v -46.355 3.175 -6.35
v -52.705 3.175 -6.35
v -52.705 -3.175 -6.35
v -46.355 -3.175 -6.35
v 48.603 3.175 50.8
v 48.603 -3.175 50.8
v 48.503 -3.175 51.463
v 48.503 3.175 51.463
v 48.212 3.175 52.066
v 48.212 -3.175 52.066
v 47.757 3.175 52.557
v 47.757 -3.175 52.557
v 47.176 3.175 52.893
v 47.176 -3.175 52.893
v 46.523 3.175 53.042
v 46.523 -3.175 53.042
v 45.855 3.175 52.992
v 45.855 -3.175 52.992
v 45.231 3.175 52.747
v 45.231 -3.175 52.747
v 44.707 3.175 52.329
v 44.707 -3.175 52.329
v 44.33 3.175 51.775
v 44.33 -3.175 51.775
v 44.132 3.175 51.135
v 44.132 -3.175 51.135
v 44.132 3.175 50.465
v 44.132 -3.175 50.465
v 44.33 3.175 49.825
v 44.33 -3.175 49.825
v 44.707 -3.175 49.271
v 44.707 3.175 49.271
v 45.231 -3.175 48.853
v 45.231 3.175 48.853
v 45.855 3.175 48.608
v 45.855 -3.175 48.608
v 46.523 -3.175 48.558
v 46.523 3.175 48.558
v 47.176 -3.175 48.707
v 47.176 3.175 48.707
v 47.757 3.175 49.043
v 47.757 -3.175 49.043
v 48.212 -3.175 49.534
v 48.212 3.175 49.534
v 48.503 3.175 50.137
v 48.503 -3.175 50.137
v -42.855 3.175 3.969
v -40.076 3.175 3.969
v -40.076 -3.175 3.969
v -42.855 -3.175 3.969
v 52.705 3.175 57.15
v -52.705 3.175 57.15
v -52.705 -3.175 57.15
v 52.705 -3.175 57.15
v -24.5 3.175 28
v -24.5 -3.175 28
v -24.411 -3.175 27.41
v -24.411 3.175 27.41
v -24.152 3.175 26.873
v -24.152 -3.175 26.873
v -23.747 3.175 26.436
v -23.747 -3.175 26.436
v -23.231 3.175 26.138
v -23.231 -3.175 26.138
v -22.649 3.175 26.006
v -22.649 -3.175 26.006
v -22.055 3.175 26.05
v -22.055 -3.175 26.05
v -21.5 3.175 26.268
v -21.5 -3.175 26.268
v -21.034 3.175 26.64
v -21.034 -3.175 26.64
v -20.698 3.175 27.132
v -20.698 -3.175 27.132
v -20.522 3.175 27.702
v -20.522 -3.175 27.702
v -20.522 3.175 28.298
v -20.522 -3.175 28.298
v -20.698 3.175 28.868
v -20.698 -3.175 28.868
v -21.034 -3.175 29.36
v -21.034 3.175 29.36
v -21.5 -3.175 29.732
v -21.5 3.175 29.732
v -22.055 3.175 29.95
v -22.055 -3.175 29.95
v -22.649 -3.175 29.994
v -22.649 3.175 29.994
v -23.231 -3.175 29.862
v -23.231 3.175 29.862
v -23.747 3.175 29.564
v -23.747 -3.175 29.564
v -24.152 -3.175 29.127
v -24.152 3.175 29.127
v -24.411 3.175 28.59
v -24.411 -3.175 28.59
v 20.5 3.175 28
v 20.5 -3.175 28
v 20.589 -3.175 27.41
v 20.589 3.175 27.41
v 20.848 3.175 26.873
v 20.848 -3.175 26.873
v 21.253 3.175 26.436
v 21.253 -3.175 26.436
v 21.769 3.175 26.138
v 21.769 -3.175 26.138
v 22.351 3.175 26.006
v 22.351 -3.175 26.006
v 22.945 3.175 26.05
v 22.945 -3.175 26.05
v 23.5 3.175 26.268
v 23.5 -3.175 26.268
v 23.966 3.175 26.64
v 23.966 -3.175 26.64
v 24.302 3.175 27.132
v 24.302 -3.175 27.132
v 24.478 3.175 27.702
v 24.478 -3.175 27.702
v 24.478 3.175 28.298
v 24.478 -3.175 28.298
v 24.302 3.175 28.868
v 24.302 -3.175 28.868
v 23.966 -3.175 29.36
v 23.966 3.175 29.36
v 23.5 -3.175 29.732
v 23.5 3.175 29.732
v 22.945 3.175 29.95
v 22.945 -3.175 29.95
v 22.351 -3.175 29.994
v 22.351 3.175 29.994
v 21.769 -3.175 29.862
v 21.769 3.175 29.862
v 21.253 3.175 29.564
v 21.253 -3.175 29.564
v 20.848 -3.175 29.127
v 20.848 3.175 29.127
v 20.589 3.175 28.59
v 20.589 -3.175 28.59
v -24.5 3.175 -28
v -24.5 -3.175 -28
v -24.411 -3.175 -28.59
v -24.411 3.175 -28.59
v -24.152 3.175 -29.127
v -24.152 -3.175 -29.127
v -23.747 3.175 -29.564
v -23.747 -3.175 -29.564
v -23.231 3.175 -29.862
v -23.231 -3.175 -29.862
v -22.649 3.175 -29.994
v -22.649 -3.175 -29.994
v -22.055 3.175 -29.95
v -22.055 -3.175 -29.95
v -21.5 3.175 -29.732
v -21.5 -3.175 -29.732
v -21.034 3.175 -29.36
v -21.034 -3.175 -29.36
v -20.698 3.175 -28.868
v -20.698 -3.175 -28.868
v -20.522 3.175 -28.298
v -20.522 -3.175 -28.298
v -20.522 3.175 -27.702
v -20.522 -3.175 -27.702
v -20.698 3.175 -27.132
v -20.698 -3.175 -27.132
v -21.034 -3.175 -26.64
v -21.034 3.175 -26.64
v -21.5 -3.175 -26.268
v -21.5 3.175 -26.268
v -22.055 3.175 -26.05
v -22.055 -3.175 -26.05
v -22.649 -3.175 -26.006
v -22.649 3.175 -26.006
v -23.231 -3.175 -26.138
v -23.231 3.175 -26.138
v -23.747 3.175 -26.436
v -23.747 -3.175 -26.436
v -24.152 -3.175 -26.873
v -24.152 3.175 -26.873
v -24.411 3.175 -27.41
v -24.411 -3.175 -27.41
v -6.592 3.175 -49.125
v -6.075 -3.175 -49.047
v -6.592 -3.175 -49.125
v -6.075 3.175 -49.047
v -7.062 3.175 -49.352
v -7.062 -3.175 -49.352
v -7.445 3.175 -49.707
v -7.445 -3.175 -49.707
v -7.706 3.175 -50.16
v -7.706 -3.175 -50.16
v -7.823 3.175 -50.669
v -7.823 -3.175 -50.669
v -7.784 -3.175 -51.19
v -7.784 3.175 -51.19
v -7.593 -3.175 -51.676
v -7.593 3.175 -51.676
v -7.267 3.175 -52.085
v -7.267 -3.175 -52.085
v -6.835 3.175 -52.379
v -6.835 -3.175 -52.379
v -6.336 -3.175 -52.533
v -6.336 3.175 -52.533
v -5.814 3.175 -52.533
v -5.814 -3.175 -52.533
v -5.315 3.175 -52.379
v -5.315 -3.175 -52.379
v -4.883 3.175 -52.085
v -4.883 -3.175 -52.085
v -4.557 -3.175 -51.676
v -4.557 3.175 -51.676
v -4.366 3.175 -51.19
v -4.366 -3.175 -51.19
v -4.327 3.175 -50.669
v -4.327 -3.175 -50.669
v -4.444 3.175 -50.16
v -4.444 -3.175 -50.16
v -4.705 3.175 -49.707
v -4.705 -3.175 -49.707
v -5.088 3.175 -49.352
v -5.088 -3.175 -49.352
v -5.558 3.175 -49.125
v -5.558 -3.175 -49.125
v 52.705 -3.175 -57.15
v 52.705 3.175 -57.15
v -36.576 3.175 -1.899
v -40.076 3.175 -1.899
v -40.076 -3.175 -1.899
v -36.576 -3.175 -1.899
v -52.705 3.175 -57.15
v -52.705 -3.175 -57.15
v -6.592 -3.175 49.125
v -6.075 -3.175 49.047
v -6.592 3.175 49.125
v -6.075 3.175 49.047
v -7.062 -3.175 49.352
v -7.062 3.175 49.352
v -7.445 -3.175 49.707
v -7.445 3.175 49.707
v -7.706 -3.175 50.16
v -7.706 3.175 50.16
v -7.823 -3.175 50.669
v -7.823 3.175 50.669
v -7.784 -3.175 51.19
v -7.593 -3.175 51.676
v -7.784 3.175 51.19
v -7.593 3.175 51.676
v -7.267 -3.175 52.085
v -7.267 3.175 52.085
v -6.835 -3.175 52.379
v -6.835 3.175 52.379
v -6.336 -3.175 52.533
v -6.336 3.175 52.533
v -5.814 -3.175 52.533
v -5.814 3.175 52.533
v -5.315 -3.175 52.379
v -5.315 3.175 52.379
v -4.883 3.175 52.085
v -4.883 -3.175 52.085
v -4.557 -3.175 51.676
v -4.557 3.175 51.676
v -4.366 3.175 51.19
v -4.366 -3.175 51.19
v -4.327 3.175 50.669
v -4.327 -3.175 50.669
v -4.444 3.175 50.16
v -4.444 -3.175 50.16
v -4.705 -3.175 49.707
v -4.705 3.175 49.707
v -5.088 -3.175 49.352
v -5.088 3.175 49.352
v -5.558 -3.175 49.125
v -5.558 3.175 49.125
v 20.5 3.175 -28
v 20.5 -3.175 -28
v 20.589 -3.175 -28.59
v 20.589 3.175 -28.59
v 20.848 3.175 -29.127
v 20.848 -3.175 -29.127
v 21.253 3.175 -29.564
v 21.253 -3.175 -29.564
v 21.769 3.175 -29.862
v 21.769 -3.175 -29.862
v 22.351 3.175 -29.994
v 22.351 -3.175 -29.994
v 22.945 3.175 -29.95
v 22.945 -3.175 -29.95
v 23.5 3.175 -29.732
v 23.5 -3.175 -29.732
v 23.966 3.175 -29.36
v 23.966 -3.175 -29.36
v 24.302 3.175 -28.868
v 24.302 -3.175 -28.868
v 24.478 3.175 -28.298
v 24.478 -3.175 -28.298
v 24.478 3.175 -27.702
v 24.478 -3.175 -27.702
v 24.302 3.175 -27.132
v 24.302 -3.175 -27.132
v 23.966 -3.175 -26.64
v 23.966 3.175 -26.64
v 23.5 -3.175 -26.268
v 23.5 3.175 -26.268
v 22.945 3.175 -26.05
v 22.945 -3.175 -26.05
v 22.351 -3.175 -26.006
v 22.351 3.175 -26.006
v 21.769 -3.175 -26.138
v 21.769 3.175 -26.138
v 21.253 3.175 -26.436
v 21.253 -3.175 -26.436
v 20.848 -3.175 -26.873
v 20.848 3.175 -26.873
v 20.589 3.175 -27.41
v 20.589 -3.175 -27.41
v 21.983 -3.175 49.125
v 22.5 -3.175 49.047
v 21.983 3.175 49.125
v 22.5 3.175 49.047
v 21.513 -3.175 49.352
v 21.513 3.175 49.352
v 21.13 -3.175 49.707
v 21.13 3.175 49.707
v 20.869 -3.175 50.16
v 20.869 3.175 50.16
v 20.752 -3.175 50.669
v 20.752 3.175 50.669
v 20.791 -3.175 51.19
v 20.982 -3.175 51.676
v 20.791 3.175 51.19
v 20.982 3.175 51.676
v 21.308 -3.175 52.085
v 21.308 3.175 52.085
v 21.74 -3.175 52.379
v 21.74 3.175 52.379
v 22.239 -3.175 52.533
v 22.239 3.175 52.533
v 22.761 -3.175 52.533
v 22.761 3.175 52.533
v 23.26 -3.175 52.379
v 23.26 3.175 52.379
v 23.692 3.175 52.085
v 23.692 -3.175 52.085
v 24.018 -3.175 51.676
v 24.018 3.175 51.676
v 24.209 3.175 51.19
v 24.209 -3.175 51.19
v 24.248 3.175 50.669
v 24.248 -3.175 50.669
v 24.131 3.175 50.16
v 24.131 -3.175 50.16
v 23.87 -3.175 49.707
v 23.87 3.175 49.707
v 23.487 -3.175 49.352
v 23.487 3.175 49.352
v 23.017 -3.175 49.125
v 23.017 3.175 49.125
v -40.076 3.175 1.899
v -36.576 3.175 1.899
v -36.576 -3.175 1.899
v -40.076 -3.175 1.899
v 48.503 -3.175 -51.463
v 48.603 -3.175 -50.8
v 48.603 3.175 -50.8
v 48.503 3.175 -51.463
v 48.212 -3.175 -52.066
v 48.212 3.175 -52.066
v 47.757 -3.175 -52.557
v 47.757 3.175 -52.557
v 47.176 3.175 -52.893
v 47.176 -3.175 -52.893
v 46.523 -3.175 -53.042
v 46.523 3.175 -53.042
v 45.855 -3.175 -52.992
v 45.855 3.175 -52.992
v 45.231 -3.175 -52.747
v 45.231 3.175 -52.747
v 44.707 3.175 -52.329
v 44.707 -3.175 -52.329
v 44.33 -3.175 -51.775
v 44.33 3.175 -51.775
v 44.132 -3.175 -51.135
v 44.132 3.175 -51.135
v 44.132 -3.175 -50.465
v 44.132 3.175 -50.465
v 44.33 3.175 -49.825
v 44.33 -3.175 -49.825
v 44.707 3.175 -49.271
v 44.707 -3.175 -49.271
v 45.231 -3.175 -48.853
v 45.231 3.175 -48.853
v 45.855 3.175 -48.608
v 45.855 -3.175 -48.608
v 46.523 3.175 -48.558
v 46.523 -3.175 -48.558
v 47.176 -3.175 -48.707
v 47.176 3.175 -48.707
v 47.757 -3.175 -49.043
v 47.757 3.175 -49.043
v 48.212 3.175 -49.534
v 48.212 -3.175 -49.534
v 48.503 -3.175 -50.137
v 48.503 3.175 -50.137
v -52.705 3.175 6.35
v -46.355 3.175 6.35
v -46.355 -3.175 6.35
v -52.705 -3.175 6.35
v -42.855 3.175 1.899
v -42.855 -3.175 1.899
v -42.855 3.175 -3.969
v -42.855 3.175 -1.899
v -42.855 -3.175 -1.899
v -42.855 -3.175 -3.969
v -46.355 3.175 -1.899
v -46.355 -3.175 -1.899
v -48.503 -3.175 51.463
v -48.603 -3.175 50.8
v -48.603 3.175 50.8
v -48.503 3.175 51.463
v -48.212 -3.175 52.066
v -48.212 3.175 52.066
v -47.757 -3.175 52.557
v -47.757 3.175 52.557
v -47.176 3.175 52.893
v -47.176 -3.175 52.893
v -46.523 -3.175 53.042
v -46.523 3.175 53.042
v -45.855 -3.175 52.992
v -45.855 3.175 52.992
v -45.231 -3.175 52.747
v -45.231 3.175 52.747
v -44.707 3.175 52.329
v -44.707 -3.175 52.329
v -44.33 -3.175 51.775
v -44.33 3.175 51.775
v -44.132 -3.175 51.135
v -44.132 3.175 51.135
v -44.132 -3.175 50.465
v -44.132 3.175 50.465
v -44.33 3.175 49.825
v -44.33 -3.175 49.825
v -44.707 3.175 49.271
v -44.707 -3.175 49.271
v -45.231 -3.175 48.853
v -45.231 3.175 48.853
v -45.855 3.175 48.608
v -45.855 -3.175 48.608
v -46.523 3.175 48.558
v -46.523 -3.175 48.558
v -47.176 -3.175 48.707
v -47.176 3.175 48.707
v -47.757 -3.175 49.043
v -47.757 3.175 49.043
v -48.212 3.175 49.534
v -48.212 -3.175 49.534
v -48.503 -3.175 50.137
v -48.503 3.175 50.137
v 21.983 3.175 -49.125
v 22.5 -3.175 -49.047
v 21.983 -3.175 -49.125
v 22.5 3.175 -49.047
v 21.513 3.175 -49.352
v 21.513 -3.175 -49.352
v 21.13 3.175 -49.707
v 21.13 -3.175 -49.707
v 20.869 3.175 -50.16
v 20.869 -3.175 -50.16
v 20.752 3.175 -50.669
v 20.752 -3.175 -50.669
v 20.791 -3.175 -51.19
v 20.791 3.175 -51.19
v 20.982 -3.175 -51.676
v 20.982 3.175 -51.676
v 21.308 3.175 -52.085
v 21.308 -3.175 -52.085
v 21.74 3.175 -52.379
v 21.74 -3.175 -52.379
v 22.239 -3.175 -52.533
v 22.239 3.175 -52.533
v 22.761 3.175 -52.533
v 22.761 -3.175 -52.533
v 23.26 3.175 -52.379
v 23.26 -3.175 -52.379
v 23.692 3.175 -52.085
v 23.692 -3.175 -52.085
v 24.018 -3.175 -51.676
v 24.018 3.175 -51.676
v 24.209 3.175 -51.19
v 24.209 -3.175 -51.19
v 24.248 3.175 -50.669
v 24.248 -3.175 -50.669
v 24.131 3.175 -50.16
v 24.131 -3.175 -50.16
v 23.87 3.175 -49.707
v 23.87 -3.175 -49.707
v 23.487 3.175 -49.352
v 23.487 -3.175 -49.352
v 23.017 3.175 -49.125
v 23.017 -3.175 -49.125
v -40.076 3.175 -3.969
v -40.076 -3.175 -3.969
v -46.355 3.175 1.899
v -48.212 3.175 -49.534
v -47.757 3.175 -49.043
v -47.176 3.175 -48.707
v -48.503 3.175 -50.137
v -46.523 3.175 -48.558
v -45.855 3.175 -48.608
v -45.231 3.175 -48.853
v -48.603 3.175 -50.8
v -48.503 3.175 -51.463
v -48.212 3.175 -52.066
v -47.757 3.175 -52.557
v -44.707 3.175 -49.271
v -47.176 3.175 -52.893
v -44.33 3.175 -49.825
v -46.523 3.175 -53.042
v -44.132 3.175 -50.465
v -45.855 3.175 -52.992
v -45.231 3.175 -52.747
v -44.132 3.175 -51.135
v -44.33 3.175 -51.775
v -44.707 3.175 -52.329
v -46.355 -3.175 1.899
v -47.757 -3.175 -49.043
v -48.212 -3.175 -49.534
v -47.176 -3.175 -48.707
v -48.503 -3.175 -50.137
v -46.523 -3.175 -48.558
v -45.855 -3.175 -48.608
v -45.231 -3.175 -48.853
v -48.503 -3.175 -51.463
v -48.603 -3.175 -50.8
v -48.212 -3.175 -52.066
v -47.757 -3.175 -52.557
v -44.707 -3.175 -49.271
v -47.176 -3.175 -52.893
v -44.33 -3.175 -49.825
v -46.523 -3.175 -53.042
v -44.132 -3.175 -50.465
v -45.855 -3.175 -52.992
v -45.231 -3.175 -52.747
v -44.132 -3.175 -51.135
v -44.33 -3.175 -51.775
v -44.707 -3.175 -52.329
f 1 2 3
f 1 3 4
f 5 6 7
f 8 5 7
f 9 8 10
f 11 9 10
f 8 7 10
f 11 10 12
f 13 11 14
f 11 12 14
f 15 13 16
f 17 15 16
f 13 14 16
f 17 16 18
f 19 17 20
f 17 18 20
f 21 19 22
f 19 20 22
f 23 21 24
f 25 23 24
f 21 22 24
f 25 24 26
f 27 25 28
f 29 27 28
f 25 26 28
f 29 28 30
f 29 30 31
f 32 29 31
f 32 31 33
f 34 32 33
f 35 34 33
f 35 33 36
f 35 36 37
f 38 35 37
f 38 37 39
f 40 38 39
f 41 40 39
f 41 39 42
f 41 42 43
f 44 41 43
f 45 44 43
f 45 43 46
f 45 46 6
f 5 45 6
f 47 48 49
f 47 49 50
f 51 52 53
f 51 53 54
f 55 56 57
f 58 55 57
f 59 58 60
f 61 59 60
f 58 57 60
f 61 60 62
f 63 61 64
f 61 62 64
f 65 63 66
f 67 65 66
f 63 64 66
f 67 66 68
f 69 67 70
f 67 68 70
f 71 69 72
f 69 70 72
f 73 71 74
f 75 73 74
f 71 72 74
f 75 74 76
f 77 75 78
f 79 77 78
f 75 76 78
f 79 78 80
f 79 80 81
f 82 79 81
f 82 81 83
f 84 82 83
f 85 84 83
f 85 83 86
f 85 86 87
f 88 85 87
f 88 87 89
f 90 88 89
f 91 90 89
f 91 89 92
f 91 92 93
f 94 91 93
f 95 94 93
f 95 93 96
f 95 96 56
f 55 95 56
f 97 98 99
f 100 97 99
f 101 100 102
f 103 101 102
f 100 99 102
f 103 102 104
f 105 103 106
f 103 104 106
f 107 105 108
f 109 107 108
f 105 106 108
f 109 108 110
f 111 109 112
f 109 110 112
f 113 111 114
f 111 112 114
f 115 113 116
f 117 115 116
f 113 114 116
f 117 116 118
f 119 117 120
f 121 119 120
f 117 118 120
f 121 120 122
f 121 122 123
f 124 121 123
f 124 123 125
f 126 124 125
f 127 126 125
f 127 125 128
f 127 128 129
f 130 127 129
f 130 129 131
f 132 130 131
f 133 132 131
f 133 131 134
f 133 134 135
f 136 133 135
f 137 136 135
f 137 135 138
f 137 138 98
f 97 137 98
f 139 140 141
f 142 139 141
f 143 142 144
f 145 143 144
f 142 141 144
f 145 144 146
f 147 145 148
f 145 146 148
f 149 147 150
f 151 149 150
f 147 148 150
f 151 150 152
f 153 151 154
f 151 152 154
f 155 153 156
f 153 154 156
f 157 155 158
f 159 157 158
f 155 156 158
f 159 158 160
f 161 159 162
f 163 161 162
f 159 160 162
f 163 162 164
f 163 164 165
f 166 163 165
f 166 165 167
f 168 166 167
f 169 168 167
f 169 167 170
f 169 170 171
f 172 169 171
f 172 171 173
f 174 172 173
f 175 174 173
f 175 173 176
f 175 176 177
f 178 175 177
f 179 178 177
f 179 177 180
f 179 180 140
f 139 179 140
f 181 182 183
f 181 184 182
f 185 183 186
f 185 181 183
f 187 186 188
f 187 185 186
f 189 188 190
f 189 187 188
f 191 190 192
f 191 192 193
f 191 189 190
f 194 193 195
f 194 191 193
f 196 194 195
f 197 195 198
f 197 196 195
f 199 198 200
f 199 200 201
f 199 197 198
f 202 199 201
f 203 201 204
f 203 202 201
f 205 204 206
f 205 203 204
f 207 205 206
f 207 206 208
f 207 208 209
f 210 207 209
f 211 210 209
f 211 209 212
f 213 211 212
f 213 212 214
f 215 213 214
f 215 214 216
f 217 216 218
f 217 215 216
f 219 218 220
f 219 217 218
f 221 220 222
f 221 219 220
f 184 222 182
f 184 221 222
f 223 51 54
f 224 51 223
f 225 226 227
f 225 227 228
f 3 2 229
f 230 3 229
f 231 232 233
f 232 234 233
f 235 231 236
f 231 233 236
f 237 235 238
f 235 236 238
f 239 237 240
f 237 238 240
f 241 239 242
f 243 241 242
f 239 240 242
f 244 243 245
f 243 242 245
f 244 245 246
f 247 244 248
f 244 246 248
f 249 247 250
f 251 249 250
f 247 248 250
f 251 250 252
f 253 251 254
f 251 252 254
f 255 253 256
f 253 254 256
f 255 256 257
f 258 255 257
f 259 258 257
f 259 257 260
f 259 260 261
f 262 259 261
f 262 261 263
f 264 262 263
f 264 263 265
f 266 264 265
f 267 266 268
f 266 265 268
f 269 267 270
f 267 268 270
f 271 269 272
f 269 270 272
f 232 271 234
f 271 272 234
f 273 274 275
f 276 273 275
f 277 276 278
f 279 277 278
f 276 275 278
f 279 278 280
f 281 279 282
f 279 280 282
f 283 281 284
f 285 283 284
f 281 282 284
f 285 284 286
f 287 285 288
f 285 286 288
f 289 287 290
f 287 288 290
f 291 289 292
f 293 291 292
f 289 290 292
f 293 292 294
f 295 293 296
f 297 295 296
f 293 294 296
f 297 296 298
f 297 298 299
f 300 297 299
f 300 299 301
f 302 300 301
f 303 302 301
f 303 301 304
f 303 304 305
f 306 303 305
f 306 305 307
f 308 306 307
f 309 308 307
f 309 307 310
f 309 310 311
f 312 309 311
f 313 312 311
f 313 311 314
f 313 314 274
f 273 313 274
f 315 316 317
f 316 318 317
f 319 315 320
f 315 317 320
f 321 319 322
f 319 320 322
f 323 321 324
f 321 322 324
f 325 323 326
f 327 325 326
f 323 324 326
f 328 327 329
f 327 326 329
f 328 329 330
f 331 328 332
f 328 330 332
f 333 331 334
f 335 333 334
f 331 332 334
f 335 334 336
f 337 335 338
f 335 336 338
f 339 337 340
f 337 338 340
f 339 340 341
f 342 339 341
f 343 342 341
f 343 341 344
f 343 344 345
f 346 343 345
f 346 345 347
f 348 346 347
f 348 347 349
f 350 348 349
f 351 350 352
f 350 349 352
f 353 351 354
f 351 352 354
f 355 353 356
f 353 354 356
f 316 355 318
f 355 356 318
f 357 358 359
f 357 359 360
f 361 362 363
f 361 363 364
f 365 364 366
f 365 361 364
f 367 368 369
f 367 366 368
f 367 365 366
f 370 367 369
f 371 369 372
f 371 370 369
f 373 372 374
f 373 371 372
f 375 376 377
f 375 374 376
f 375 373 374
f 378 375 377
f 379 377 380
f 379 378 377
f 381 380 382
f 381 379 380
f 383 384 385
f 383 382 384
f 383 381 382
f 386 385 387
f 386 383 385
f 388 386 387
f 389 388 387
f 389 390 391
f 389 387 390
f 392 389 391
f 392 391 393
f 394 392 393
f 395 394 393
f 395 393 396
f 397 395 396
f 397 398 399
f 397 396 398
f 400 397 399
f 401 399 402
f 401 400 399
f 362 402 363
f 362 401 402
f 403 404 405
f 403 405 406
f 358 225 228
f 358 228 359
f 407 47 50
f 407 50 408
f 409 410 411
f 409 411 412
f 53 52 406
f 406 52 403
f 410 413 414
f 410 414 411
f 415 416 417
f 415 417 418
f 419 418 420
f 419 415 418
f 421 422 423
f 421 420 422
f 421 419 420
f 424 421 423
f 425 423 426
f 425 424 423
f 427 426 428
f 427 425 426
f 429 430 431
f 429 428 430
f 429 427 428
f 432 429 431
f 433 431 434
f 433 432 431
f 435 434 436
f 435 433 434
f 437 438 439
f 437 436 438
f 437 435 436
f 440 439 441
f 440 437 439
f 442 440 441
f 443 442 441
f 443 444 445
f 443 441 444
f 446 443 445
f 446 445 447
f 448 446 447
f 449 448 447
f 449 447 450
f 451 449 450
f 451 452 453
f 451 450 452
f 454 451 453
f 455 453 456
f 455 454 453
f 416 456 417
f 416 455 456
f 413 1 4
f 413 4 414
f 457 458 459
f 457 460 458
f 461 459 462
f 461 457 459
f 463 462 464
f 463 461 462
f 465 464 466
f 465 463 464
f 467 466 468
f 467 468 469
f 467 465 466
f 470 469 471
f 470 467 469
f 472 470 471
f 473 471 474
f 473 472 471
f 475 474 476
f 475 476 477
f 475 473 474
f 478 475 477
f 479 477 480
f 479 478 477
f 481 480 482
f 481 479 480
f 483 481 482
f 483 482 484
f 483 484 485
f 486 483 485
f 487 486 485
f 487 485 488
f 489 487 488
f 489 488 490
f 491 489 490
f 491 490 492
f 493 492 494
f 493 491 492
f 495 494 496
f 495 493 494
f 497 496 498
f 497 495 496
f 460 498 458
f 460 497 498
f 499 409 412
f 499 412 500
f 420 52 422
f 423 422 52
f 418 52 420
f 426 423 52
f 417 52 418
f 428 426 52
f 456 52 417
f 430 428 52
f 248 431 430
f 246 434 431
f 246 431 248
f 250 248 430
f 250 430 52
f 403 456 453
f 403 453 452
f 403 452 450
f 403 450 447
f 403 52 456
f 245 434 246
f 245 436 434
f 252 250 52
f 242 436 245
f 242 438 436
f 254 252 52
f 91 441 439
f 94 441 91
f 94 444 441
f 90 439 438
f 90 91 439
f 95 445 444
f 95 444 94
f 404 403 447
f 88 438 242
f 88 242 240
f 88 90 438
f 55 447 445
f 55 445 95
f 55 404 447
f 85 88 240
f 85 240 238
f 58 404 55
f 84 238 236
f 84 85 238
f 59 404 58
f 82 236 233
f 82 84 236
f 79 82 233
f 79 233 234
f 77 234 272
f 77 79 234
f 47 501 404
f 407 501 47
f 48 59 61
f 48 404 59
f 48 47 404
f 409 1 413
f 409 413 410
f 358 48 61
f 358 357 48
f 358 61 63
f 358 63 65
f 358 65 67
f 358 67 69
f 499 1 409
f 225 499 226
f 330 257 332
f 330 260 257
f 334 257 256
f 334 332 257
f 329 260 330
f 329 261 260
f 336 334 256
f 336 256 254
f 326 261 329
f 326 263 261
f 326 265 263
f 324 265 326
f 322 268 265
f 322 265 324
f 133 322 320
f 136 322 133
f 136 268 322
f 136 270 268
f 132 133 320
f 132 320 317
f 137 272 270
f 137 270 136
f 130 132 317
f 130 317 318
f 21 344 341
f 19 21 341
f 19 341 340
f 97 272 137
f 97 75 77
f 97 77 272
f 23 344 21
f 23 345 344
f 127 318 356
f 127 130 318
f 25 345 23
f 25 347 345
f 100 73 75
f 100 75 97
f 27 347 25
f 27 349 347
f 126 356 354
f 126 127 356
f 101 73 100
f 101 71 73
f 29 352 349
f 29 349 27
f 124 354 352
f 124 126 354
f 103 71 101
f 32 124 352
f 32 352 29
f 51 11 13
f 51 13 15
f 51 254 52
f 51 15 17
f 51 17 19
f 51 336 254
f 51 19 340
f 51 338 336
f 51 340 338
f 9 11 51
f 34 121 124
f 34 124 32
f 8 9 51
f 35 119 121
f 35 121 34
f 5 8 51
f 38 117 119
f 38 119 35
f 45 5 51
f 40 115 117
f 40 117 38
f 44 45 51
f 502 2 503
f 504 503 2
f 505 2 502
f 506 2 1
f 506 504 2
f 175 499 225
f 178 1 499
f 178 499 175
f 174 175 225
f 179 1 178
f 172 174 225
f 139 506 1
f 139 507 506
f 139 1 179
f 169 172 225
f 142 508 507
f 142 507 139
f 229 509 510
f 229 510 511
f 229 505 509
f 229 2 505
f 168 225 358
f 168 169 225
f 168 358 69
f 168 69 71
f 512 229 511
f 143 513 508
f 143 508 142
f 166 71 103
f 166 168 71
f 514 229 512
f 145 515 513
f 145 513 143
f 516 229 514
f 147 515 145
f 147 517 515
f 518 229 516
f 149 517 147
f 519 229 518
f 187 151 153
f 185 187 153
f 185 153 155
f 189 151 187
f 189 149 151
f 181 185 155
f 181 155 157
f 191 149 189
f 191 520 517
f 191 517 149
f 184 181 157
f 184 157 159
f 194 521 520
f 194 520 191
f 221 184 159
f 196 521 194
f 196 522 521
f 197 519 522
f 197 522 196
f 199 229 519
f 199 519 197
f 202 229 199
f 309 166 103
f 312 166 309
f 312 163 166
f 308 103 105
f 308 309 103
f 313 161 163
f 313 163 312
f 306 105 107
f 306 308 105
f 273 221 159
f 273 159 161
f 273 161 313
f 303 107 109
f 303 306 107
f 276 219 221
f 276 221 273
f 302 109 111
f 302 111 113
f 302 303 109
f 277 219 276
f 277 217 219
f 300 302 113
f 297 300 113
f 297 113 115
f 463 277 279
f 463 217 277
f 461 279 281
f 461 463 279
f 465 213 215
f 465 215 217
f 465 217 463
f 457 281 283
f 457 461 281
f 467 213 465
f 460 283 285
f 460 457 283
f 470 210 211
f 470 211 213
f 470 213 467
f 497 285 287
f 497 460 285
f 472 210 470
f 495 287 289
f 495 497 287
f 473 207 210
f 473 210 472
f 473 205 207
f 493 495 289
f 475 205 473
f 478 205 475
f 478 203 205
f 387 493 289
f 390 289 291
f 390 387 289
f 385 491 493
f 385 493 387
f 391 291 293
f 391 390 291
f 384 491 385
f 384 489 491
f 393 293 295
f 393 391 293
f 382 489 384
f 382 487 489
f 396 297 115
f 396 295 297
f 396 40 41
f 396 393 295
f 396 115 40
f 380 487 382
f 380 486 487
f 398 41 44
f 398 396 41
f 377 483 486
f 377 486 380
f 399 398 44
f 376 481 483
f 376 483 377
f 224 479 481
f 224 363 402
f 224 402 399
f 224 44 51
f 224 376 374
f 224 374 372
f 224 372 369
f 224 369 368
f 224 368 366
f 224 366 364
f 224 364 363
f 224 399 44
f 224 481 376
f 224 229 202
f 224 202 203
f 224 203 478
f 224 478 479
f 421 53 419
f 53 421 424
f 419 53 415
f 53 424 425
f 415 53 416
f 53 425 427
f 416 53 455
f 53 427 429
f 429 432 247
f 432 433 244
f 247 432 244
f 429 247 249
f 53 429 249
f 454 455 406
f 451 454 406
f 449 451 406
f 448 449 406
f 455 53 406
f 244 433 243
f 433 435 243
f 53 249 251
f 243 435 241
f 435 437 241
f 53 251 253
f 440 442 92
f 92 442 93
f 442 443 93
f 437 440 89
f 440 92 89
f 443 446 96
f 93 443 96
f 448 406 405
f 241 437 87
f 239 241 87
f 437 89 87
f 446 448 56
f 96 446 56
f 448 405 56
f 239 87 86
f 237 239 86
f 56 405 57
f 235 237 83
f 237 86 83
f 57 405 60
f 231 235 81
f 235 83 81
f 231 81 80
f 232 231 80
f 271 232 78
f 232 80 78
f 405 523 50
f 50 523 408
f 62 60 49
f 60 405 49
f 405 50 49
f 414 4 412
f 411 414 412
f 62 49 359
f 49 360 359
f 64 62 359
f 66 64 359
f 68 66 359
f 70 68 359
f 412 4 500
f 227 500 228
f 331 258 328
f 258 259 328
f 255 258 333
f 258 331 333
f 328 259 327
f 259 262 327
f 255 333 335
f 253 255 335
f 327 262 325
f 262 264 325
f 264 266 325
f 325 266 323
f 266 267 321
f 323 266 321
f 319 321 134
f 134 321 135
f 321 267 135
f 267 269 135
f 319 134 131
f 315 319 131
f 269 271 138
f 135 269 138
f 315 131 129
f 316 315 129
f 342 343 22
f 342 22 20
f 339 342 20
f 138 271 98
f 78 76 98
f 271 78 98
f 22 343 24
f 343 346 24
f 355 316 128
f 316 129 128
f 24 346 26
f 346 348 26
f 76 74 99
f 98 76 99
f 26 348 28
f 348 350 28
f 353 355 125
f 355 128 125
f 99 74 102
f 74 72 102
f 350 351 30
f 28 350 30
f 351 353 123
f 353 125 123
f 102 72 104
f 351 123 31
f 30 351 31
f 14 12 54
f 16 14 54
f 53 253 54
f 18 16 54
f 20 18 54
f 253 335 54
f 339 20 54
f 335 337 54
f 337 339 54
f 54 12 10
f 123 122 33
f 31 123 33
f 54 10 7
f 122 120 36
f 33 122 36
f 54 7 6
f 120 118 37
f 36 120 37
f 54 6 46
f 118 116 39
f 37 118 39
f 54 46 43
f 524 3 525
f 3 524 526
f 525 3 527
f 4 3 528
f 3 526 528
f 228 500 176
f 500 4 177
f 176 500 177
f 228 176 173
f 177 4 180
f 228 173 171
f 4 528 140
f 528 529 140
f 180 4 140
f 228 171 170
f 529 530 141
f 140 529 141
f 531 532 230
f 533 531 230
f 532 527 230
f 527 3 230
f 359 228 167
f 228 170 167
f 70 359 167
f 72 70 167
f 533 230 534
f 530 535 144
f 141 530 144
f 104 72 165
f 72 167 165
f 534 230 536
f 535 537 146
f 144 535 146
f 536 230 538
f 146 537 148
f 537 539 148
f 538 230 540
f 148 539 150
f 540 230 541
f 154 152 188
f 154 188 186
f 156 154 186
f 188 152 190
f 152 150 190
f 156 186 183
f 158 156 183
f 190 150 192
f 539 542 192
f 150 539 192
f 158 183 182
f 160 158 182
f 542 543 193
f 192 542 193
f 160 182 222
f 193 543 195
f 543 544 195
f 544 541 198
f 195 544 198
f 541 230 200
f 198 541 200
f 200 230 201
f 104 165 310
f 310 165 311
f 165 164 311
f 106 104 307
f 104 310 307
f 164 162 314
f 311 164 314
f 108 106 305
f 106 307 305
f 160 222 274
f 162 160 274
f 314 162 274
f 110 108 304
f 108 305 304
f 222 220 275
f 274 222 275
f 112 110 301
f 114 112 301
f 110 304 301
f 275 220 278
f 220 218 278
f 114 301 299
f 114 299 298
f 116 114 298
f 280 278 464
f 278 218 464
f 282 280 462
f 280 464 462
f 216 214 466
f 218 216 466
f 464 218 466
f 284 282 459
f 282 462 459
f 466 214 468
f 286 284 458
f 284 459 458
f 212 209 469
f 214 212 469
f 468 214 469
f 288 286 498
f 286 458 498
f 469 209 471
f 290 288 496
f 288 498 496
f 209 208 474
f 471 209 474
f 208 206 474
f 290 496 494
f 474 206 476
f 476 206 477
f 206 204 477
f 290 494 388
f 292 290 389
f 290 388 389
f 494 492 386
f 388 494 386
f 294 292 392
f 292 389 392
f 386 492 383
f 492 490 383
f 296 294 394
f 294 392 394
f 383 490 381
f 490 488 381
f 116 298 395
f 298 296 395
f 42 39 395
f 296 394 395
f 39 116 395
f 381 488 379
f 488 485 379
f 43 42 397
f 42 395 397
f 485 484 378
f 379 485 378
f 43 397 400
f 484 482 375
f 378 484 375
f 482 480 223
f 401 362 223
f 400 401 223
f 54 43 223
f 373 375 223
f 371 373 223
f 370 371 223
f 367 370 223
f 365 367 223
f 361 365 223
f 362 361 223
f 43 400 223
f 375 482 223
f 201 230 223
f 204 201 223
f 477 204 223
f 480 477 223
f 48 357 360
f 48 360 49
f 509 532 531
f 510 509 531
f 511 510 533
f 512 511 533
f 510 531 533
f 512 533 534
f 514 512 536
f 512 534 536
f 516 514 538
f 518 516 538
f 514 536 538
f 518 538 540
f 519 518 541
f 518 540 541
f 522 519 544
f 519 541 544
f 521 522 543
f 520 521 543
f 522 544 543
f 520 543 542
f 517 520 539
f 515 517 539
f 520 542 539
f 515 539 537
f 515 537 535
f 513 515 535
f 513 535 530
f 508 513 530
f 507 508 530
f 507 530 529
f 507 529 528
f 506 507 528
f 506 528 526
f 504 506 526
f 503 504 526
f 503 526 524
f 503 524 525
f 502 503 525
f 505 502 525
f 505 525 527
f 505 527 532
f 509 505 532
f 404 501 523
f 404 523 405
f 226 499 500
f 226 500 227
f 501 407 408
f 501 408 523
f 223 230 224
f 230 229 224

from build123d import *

# Parameters (mm, degrees)
SKETCH1_W                      = 105.41
SKETCH1_H                      = 114.3
BOSS_EXTRUDE1_DEPTH            = 3.175
F_4_0_4_DIAMETER_HOLE1_D       = 4
LPATTERN1_COUNT                = 2
LPATTERN1_PITCH                = 56
LPATTERN1_COUNT_DIR2           = 2
LPATTERN1_PITCH_DIR2           = 45
F_8_CLEARANCE_HOLE1_D          = 4.4958
MIRROR2_COPY_1_D               = 4.4958
F_6_CLEARANCE_HOLE1_AT_2_COUNT = 2
F_6_CLEARANCE_HOLE1_AT_2_PITCH = 28.575
CUT_EXTRUDE1_REACH             = 80.002


with BuildPart() as part:
    # Sketch1 → Boss-Extrude1 (new, symmetric)
    with BuildSketch(Plane(origin=(0, 0, 0), x_dir=(1, 0, 0), z_dir=(0, 1, 0))):
        Rectangle(SKETCH1_W, SKETCH1_H)
    extrude(amount=BOSS_EXTRUDE1_DEPTH, both=True)

    # Ø4.0 (4) Diameter Hole1 (through all)
    with Locations(Plane(origin=(0, 3.175, 0), x_dir=(1, 0, 0), z_dir=(0, 1, 0))):
        with Locations((22.5, 28)):
            f_4_0_4_diameter_hole1 = Hole(F_4_0_4_DIAMETER_HOLE1_D / 2)

    # LPattern1: 4.0 _4_ Diameter Hole1 2 × 2
    with Locations(*[(-j * LPATTERN1_PITCH_DIR2, 0, i * LPATTERN1_PITCH) for i in range(LPATTERN1_COUNT) for j in range(LPATTERN1_COUNT_DIR2) if (i, j) != (0, 0)]):
        add(f_4_0_4_diameter_hole1, mode=Mode.SUBTRACT)

    # #8 Clearance Hole1 (through all)
    with Locations(Plane(origin=(0, 3.175, 0), x_dir=(1, 0, 0), z_dir=(0, 1, 0))):
        with Locations((-46.355, 50.8)):
            f_8_clearance_hole1 = Hole(F_8_CLEARANCE_HOLE1_D / 2)

    # Mirror1: #8 Clearance Hole1 across plane
    add(f_8_clearance_hole1.mirror(Plane.XY), mode=Mode.SUBTRACT)

    # Mirror2: #8 Clearance Hole1 across plane
    add(f_8_clearance_hole1.mirror(Plane(origin=(0, 0, 0), x_dir=(0, 0, 1), z_dir=(1, 0, 0))), mode=Mode.SUBTRACT)

    # Mirror2 copy 1 (through all)
    with Locations(Plane(origin=(0, 3.175, 0), x_dir=(-1, 0, 0), z_dir=(0, 1, 0))):
        with Locations((-46.355, 50.8)):
            Hole(MIRROR2_COPY_1_D / 2)

    # Sketch6 → #6 Clearance Hole1 (revolve, cut)
    with BuildSketch(Plane(origin=(22.5, 3.175, -50.8), x_dir=(0, 0, 1), z_dir=(1, 0, 0))):
        Polygon((0, 0), (0, 7.403068321), (1.7526, 6.35), (1.7526, 0), align=None)
    f_6_clearance_hole1 = revolve(axis=Axis((22.5, 9.525, -50.8), (0, -1, 0)), mode=Mode.SUBTRACT)

    # #6 Clearance Hole1 at 2: #6 Clearance Hole1 ×2
    with Locations(*[(-i * F_6_CLEARANCE_HOLE1_AT_2_PITCH, 0, 0) for i in range(1, F_6_CLEARANCE_HOLE1_AT_2_COUNT)]):
        add(f_6_clearance_hole1, mode=Mode.SUBTRACT)

    # Sketch8 → Cut-Extrude1 (cut, up to next)
    with BuildSketch(Plane(origin=(0, 3.175, 0), x_dir=(1, 0, 0), z_dir=(0, 1, 0)), mode=Mode.PRIVATE) as cut_extrude1_sk1:
        Polygon((-52.705, -6.35), (-52.705, 6.35), (-46.355, 6.35), (-46.355, 1.89865), (-42.8545625, 1.89865), (-42.8545625, 3.96875), (-40.0764375, 3.96875), (-40.0764375, 1.89865), (-36.576, 1.89865), (-36.576, -1.89865), (-40.0764375, -1.89865), (-40.0764375, -3.96875), (-42.8545625, -3.96875), (-42.8545625, -1.89865), (-46.355, -1.89865), (-46.355, -6.35), align=None)
    cut_extrude1_tool1 = extrude(cut_extrude1_sk1.sketch, amount=-CUT_EXTRUDE1_REACH, mode=Mode.PRIVATE) & part.part
    add(cut_extrude1_tool1.solids().sort_by_distance((-46.496113, 3.175, 0))[0], mode=Mode.SUBTRACT)

    # Mirror3: #6 Clearance Hole1 across plane
    add(f_6_clearance_hole1.mirror(Plane.XY), mode=Mode.SUBTRACT)

    # Mirror3 copy 1 sketch → Mirror3 copy 1 (revolve, cut)
    with BuildSketch(Plane(origin=(-6.075, 3.175, 50.8), x_dir=(0, 0, -1), z_dir=(1, 0, 0))):
        Polygon((0, 0), (0, -7.403068321), (1.7526, -6.35), (1.7526, 0), align=None)
    revolve(axis=Axis((-6.075, 9.525, 50.8), (0, 1, 0)), mode=Mode.SUBTRACT)


solid = part.part
